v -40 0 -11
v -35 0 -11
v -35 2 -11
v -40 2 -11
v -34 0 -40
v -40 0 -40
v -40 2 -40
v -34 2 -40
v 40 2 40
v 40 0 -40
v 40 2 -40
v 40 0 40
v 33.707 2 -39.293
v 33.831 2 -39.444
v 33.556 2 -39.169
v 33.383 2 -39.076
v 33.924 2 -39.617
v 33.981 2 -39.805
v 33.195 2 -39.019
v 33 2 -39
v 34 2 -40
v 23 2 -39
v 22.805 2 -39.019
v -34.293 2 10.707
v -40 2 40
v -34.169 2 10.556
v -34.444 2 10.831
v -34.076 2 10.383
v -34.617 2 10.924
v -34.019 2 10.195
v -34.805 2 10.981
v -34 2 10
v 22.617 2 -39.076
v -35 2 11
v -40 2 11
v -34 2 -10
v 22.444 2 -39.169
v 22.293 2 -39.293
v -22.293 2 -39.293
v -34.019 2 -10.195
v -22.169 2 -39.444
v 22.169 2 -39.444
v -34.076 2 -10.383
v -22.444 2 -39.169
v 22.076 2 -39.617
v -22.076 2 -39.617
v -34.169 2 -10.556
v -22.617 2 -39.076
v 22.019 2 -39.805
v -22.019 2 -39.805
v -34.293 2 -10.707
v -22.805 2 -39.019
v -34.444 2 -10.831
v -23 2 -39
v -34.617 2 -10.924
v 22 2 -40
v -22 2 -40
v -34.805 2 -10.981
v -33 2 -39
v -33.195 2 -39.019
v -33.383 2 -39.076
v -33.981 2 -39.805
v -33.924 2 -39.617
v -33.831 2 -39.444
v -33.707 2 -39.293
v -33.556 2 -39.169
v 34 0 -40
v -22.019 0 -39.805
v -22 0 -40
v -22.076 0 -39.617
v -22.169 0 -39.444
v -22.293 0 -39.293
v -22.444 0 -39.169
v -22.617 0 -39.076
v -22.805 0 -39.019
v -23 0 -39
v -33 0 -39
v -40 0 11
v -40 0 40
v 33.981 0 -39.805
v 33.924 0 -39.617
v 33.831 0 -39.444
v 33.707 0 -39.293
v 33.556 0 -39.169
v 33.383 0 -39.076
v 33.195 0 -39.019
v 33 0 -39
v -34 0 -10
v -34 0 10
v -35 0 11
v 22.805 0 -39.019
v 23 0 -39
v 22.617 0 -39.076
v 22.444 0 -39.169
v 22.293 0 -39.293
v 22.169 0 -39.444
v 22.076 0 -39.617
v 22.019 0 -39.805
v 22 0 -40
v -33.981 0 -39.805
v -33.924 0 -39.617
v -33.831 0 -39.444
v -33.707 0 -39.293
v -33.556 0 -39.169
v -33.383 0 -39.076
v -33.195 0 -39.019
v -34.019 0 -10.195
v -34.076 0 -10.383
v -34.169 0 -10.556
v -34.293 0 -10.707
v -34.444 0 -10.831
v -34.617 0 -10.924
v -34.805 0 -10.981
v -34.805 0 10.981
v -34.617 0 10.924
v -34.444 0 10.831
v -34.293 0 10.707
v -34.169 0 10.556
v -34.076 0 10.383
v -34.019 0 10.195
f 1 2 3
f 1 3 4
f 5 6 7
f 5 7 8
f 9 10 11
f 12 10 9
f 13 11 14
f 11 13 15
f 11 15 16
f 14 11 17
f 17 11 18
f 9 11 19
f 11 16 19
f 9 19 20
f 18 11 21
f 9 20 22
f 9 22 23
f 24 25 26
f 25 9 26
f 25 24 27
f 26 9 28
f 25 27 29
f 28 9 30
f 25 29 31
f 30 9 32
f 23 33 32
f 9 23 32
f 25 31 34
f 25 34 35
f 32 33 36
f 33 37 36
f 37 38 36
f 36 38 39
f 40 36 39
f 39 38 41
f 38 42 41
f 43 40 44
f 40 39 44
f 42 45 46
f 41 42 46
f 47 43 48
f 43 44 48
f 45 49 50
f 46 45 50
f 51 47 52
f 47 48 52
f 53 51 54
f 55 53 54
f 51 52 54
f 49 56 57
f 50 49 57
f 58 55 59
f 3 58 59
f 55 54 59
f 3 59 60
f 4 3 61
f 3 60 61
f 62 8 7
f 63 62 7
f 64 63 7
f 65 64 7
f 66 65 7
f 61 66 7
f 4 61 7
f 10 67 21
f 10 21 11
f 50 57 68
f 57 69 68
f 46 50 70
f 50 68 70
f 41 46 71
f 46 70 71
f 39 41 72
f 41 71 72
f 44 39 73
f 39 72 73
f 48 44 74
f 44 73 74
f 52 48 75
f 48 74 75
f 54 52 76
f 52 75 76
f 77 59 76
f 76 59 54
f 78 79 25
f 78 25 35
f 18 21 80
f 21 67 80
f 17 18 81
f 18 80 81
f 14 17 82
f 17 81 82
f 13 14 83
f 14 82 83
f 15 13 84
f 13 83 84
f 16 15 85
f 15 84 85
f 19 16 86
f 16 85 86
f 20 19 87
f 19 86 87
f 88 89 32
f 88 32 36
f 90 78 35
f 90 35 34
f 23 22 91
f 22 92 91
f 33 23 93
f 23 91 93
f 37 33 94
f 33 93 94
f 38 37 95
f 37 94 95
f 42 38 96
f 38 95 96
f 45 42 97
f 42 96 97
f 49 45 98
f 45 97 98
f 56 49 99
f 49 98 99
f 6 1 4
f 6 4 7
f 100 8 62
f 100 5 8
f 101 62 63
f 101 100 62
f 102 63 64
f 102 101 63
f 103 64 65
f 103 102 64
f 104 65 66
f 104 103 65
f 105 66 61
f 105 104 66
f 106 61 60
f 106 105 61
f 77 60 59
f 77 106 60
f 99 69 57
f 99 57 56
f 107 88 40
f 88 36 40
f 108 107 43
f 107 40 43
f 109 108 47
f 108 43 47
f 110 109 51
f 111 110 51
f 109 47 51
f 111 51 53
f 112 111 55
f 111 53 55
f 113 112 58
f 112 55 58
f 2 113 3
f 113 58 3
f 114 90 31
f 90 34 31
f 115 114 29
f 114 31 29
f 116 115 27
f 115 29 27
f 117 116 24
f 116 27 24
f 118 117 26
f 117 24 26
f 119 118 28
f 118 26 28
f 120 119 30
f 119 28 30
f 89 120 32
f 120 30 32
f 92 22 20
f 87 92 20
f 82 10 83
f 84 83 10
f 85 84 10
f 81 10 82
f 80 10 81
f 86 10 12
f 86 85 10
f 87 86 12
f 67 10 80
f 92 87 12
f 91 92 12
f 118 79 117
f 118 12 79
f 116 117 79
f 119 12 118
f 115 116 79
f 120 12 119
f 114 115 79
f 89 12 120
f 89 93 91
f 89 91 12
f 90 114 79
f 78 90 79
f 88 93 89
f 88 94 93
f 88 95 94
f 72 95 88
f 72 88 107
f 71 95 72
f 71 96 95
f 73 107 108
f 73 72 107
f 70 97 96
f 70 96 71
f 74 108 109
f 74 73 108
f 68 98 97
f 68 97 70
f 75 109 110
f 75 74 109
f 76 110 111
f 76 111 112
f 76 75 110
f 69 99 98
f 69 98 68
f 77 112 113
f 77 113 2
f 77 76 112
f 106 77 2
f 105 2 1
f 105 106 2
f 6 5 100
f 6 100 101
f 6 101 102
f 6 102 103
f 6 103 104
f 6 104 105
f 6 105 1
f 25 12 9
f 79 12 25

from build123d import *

# Parameters (mm, degrees)
EXTRUDE_1_DEPTH     = 2
SKETCH_2_W          = 12
SKETCH_2_H          = 1
CUT_EXTRUDE_1_DEPTH = 2
FILLET_1_R          = 1
FILLET_2_R          = 1


with BuildPart() as part:
    # 草图1 → 凸台-拉伸1 (new body)
    with BuildSketch(Plane(origin=(0, 0, 0), x_dir=(1, 0, 0), z_dir=(0, 1, 0))):
        Polygon((-40, 11), (-40, 40), (40, 40), (40, -40), (-40, -40), (-40, -11), (-34, -11), (-34, 11), align=None)
    extrude(amount=EXTRUDE_1_DEPTH)

    # 草图2 → 切除-拉伸1 (cut)
    with BuildSketch(Plane(origin=(0, 2, 0), x_dir=(1, 0, 0), z_dir=(0, 1, 0))):
        with Locations((-28, 39.5)):
            Rectangle(SKETCH_2_W, SKETCH_2_H)
        with Locations((28, 39.5)):
            Rectangle(SKETCH_2_W, SKETCH_2_H)
    extrude(amount=-CUT_EXTRUDE_1_DEPTH, mode=Mode.SUBTRACT)

    # 圆角1
    fillet_1_edges = [part.edges().sort_by_distance(p)[0] for p in [
        (22, 1, -39),
        (34, 1, -39),
        (-34, 1, -39),
        (-22, 1, -39),
    ]]
    fillet(fillet_1_edges, radius=FILLET_1_R - 0.0001)  # a hair under: the kernel refuses the full size

    # 圆角2
    fillet_2_edges = [part.edges().sort_by_distance(p)[0] for p in [
        (-34, 1, 11),
        (-34, 1, -11),
    ]]
    fillet(fillet_2_edges, radius=FILLET_2_R)


solid = part.part
